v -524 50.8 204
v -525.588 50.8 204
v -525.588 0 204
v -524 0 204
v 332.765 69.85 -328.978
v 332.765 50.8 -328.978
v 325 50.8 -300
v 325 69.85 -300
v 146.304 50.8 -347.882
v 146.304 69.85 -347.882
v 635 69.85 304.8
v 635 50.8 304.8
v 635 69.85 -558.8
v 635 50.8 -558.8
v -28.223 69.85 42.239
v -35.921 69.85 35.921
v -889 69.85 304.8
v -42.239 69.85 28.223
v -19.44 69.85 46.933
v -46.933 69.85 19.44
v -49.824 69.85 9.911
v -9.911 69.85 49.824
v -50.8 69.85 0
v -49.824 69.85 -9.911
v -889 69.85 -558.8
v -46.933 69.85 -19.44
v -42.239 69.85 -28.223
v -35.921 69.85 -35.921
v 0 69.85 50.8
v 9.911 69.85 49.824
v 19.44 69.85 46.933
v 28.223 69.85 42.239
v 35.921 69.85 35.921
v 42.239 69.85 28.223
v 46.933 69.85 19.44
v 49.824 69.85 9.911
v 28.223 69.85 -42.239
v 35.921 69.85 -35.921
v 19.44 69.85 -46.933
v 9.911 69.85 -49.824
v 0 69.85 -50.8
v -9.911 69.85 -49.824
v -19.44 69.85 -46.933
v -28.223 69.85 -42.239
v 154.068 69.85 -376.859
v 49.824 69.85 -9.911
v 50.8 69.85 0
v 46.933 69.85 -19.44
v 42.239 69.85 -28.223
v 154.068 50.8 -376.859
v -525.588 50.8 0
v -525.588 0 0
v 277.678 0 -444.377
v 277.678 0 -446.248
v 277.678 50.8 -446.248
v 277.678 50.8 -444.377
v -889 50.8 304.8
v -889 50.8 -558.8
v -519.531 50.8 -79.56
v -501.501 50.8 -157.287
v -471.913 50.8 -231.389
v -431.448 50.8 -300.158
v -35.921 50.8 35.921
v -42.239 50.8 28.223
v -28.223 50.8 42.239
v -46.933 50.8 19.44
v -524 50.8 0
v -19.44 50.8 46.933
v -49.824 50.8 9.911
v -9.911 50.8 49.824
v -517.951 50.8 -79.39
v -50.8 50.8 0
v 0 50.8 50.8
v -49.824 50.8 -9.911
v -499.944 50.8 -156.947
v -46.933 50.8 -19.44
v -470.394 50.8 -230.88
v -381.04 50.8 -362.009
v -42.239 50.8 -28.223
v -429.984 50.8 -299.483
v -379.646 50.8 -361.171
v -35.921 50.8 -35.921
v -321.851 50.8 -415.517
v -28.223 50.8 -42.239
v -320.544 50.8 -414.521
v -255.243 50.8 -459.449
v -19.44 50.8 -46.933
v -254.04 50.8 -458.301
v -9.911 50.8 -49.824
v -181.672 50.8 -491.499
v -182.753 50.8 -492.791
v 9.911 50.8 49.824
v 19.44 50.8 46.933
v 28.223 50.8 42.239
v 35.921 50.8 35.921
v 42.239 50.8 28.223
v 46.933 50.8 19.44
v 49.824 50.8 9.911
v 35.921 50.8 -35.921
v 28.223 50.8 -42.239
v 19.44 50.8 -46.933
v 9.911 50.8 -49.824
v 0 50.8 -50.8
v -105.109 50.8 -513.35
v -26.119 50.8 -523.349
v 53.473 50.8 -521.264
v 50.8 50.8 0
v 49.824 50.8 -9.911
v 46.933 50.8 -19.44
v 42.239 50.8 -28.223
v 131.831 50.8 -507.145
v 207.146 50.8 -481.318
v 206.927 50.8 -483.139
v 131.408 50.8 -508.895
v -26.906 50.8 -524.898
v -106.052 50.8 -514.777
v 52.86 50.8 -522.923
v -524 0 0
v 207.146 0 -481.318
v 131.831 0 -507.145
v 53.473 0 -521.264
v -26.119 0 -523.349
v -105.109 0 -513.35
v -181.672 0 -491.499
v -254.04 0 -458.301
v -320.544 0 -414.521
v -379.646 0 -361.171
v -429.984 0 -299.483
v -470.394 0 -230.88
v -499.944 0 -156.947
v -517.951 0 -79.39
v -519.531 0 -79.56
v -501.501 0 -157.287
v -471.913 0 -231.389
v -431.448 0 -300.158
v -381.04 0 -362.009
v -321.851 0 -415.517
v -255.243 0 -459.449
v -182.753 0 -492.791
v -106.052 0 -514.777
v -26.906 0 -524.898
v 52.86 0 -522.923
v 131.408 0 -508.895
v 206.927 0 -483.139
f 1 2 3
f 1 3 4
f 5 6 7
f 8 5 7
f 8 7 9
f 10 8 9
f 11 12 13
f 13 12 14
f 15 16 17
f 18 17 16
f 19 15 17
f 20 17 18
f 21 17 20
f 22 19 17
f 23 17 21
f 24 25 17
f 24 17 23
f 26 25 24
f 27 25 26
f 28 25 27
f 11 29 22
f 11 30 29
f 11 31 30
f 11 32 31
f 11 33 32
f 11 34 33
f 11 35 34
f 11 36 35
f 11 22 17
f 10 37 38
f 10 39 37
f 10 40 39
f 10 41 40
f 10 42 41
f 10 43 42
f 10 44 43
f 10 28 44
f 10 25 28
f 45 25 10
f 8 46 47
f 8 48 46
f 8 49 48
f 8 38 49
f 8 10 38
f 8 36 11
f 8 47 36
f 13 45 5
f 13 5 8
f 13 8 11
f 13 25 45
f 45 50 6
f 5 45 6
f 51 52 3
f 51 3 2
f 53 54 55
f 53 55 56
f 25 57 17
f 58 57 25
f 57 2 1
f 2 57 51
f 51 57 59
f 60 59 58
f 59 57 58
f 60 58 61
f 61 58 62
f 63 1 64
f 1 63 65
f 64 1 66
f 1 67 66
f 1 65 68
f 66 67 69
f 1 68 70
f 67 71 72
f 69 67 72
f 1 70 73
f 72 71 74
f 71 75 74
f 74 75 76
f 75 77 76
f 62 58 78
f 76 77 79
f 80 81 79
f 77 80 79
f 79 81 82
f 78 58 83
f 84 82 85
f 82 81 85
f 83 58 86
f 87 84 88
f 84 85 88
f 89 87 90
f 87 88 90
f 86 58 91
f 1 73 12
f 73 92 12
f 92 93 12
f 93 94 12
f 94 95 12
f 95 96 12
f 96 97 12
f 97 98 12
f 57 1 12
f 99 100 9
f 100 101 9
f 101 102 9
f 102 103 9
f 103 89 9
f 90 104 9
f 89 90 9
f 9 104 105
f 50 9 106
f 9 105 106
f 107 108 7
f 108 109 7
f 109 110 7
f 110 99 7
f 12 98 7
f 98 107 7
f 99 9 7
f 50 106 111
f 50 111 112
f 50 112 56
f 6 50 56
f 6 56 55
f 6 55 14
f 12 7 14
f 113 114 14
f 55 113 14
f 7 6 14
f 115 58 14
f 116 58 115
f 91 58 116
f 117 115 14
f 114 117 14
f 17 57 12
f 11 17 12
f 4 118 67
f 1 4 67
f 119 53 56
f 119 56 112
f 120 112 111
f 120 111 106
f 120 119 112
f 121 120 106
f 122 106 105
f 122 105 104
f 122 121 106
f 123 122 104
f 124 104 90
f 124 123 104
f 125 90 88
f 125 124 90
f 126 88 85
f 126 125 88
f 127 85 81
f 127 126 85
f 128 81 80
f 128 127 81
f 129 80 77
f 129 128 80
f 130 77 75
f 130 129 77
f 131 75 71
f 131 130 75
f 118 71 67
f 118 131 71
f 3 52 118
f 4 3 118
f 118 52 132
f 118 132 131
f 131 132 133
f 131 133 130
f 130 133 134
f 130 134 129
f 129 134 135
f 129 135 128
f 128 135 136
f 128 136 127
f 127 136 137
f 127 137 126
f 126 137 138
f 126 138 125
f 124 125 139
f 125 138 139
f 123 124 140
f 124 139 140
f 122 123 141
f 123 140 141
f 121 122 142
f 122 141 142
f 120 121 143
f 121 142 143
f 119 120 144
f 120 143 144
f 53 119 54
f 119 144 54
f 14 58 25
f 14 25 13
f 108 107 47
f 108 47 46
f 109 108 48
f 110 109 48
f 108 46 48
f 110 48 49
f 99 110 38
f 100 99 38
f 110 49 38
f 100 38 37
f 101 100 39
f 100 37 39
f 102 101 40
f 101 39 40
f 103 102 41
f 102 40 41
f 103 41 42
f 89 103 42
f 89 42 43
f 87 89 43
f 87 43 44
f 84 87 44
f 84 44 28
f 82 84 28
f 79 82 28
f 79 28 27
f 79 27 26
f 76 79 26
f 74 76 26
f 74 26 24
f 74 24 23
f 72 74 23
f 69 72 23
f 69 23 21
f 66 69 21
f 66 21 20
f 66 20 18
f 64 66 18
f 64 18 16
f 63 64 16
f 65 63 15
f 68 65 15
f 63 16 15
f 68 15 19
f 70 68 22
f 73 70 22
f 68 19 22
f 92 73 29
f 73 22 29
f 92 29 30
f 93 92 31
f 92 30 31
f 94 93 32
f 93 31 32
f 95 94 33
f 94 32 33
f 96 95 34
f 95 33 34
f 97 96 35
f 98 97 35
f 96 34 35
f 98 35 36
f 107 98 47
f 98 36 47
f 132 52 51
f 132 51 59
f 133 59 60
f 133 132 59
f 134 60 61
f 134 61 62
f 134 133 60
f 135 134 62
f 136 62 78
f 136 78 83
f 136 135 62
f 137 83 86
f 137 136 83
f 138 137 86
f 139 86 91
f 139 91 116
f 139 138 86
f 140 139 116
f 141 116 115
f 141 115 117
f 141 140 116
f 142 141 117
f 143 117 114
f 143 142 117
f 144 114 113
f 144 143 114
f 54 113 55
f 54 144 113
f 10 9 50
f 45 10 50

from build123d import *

# Parameters (mm, degrees)
BOSS_EXTRUDE1_DEPTH    = 50.8
SKETCH4_W              = 1524
SKETCH4_H              = 863.6
BOSS_EXTRUDE2_DEPTH    = 19.05
F_20_0MM_DOWEL_HOLE1_D = 101.6
SKETCH8_W              = 1.5875
SKETCH8_H              = 50.8
BOSS_EXTRUDE3_DEPTH    = 204
CUT_EXTRUDE1_DEPTH     = 1052.265465998


with BuildPart() as part:
    # Sketch3 → Boss-Extrude1 (new body)
    with BuildSketch(Plane(origin=(0, 0, 0), x_dir=(1, 0, 0), z_dir=(0, 1, 0))):
        with BuildLine():
            Line((-524, 0), (-525.5875, 0))
            ThreePointArc((-525.5875, 0), (-255.243310314, 459.448661655), (277.677694458, 446.248045549))
            Line((277.677694458, 446.248045549), (277.677694458, 444.377202386))
            ThreePointArc((277.677694458, 444.377202386), (-254.040241009, 458.300726541), (-524, 0))
        make_face()
    extrude(amount=BOSS_EXTRUDE1_DEPTH)

    # Sketch4 → Boss-Extrude2 (add)
    with BuildSketch(Plane(origin=(0, 50.8, 0), x_dir=(1, 0, 0), z_dir=(0, 1, 0))):
        with Locations((-127, 127)):
            Rectangle(SKETCH4_W, SKETCH4_H)
    extrude(amount=BOSS_EXTRUDE2_DEPTH)

    # Ø20.0mm Dowel Hole1 (through all)
    with Locations(Plane(origin=(0, 50.8, 0), x_dir=(-1, 0, 0), z_dir=(0, -1, 0))):
        with Locations((0, 0)):
            Hole(F_20_0MM_DOWEL_HOLE1_D / 2)

    # Sketch8 → Boss-Extrude3 (add)
    with BuildSketch(Plane.XY):
        with Locations((-524.79375, 25.4)):
            Rectangle(SKETCH8_W, SKETCH8_H)
    extrude(amount=BOSS_EXTRUDE3_DEPTH)

    # Sketch9 → Cut-Extrude1 (cut, through all)
    with BuildSketch(Plane(origin=(0, 50.8, 0), x_dir=(-1, 0, 0), z_dir=(0, -1, 0))):
        Polygon((-154.06829349, 376.859298133), (-332.764571353, 328.977774789), (-325, 300), (-146.303722137, 347.881523344), align=None)
    extrude(amount=-CUT_EXTRUDE1_DEPTH, mode=Mode.SUBTRACT)


solid = part.part
